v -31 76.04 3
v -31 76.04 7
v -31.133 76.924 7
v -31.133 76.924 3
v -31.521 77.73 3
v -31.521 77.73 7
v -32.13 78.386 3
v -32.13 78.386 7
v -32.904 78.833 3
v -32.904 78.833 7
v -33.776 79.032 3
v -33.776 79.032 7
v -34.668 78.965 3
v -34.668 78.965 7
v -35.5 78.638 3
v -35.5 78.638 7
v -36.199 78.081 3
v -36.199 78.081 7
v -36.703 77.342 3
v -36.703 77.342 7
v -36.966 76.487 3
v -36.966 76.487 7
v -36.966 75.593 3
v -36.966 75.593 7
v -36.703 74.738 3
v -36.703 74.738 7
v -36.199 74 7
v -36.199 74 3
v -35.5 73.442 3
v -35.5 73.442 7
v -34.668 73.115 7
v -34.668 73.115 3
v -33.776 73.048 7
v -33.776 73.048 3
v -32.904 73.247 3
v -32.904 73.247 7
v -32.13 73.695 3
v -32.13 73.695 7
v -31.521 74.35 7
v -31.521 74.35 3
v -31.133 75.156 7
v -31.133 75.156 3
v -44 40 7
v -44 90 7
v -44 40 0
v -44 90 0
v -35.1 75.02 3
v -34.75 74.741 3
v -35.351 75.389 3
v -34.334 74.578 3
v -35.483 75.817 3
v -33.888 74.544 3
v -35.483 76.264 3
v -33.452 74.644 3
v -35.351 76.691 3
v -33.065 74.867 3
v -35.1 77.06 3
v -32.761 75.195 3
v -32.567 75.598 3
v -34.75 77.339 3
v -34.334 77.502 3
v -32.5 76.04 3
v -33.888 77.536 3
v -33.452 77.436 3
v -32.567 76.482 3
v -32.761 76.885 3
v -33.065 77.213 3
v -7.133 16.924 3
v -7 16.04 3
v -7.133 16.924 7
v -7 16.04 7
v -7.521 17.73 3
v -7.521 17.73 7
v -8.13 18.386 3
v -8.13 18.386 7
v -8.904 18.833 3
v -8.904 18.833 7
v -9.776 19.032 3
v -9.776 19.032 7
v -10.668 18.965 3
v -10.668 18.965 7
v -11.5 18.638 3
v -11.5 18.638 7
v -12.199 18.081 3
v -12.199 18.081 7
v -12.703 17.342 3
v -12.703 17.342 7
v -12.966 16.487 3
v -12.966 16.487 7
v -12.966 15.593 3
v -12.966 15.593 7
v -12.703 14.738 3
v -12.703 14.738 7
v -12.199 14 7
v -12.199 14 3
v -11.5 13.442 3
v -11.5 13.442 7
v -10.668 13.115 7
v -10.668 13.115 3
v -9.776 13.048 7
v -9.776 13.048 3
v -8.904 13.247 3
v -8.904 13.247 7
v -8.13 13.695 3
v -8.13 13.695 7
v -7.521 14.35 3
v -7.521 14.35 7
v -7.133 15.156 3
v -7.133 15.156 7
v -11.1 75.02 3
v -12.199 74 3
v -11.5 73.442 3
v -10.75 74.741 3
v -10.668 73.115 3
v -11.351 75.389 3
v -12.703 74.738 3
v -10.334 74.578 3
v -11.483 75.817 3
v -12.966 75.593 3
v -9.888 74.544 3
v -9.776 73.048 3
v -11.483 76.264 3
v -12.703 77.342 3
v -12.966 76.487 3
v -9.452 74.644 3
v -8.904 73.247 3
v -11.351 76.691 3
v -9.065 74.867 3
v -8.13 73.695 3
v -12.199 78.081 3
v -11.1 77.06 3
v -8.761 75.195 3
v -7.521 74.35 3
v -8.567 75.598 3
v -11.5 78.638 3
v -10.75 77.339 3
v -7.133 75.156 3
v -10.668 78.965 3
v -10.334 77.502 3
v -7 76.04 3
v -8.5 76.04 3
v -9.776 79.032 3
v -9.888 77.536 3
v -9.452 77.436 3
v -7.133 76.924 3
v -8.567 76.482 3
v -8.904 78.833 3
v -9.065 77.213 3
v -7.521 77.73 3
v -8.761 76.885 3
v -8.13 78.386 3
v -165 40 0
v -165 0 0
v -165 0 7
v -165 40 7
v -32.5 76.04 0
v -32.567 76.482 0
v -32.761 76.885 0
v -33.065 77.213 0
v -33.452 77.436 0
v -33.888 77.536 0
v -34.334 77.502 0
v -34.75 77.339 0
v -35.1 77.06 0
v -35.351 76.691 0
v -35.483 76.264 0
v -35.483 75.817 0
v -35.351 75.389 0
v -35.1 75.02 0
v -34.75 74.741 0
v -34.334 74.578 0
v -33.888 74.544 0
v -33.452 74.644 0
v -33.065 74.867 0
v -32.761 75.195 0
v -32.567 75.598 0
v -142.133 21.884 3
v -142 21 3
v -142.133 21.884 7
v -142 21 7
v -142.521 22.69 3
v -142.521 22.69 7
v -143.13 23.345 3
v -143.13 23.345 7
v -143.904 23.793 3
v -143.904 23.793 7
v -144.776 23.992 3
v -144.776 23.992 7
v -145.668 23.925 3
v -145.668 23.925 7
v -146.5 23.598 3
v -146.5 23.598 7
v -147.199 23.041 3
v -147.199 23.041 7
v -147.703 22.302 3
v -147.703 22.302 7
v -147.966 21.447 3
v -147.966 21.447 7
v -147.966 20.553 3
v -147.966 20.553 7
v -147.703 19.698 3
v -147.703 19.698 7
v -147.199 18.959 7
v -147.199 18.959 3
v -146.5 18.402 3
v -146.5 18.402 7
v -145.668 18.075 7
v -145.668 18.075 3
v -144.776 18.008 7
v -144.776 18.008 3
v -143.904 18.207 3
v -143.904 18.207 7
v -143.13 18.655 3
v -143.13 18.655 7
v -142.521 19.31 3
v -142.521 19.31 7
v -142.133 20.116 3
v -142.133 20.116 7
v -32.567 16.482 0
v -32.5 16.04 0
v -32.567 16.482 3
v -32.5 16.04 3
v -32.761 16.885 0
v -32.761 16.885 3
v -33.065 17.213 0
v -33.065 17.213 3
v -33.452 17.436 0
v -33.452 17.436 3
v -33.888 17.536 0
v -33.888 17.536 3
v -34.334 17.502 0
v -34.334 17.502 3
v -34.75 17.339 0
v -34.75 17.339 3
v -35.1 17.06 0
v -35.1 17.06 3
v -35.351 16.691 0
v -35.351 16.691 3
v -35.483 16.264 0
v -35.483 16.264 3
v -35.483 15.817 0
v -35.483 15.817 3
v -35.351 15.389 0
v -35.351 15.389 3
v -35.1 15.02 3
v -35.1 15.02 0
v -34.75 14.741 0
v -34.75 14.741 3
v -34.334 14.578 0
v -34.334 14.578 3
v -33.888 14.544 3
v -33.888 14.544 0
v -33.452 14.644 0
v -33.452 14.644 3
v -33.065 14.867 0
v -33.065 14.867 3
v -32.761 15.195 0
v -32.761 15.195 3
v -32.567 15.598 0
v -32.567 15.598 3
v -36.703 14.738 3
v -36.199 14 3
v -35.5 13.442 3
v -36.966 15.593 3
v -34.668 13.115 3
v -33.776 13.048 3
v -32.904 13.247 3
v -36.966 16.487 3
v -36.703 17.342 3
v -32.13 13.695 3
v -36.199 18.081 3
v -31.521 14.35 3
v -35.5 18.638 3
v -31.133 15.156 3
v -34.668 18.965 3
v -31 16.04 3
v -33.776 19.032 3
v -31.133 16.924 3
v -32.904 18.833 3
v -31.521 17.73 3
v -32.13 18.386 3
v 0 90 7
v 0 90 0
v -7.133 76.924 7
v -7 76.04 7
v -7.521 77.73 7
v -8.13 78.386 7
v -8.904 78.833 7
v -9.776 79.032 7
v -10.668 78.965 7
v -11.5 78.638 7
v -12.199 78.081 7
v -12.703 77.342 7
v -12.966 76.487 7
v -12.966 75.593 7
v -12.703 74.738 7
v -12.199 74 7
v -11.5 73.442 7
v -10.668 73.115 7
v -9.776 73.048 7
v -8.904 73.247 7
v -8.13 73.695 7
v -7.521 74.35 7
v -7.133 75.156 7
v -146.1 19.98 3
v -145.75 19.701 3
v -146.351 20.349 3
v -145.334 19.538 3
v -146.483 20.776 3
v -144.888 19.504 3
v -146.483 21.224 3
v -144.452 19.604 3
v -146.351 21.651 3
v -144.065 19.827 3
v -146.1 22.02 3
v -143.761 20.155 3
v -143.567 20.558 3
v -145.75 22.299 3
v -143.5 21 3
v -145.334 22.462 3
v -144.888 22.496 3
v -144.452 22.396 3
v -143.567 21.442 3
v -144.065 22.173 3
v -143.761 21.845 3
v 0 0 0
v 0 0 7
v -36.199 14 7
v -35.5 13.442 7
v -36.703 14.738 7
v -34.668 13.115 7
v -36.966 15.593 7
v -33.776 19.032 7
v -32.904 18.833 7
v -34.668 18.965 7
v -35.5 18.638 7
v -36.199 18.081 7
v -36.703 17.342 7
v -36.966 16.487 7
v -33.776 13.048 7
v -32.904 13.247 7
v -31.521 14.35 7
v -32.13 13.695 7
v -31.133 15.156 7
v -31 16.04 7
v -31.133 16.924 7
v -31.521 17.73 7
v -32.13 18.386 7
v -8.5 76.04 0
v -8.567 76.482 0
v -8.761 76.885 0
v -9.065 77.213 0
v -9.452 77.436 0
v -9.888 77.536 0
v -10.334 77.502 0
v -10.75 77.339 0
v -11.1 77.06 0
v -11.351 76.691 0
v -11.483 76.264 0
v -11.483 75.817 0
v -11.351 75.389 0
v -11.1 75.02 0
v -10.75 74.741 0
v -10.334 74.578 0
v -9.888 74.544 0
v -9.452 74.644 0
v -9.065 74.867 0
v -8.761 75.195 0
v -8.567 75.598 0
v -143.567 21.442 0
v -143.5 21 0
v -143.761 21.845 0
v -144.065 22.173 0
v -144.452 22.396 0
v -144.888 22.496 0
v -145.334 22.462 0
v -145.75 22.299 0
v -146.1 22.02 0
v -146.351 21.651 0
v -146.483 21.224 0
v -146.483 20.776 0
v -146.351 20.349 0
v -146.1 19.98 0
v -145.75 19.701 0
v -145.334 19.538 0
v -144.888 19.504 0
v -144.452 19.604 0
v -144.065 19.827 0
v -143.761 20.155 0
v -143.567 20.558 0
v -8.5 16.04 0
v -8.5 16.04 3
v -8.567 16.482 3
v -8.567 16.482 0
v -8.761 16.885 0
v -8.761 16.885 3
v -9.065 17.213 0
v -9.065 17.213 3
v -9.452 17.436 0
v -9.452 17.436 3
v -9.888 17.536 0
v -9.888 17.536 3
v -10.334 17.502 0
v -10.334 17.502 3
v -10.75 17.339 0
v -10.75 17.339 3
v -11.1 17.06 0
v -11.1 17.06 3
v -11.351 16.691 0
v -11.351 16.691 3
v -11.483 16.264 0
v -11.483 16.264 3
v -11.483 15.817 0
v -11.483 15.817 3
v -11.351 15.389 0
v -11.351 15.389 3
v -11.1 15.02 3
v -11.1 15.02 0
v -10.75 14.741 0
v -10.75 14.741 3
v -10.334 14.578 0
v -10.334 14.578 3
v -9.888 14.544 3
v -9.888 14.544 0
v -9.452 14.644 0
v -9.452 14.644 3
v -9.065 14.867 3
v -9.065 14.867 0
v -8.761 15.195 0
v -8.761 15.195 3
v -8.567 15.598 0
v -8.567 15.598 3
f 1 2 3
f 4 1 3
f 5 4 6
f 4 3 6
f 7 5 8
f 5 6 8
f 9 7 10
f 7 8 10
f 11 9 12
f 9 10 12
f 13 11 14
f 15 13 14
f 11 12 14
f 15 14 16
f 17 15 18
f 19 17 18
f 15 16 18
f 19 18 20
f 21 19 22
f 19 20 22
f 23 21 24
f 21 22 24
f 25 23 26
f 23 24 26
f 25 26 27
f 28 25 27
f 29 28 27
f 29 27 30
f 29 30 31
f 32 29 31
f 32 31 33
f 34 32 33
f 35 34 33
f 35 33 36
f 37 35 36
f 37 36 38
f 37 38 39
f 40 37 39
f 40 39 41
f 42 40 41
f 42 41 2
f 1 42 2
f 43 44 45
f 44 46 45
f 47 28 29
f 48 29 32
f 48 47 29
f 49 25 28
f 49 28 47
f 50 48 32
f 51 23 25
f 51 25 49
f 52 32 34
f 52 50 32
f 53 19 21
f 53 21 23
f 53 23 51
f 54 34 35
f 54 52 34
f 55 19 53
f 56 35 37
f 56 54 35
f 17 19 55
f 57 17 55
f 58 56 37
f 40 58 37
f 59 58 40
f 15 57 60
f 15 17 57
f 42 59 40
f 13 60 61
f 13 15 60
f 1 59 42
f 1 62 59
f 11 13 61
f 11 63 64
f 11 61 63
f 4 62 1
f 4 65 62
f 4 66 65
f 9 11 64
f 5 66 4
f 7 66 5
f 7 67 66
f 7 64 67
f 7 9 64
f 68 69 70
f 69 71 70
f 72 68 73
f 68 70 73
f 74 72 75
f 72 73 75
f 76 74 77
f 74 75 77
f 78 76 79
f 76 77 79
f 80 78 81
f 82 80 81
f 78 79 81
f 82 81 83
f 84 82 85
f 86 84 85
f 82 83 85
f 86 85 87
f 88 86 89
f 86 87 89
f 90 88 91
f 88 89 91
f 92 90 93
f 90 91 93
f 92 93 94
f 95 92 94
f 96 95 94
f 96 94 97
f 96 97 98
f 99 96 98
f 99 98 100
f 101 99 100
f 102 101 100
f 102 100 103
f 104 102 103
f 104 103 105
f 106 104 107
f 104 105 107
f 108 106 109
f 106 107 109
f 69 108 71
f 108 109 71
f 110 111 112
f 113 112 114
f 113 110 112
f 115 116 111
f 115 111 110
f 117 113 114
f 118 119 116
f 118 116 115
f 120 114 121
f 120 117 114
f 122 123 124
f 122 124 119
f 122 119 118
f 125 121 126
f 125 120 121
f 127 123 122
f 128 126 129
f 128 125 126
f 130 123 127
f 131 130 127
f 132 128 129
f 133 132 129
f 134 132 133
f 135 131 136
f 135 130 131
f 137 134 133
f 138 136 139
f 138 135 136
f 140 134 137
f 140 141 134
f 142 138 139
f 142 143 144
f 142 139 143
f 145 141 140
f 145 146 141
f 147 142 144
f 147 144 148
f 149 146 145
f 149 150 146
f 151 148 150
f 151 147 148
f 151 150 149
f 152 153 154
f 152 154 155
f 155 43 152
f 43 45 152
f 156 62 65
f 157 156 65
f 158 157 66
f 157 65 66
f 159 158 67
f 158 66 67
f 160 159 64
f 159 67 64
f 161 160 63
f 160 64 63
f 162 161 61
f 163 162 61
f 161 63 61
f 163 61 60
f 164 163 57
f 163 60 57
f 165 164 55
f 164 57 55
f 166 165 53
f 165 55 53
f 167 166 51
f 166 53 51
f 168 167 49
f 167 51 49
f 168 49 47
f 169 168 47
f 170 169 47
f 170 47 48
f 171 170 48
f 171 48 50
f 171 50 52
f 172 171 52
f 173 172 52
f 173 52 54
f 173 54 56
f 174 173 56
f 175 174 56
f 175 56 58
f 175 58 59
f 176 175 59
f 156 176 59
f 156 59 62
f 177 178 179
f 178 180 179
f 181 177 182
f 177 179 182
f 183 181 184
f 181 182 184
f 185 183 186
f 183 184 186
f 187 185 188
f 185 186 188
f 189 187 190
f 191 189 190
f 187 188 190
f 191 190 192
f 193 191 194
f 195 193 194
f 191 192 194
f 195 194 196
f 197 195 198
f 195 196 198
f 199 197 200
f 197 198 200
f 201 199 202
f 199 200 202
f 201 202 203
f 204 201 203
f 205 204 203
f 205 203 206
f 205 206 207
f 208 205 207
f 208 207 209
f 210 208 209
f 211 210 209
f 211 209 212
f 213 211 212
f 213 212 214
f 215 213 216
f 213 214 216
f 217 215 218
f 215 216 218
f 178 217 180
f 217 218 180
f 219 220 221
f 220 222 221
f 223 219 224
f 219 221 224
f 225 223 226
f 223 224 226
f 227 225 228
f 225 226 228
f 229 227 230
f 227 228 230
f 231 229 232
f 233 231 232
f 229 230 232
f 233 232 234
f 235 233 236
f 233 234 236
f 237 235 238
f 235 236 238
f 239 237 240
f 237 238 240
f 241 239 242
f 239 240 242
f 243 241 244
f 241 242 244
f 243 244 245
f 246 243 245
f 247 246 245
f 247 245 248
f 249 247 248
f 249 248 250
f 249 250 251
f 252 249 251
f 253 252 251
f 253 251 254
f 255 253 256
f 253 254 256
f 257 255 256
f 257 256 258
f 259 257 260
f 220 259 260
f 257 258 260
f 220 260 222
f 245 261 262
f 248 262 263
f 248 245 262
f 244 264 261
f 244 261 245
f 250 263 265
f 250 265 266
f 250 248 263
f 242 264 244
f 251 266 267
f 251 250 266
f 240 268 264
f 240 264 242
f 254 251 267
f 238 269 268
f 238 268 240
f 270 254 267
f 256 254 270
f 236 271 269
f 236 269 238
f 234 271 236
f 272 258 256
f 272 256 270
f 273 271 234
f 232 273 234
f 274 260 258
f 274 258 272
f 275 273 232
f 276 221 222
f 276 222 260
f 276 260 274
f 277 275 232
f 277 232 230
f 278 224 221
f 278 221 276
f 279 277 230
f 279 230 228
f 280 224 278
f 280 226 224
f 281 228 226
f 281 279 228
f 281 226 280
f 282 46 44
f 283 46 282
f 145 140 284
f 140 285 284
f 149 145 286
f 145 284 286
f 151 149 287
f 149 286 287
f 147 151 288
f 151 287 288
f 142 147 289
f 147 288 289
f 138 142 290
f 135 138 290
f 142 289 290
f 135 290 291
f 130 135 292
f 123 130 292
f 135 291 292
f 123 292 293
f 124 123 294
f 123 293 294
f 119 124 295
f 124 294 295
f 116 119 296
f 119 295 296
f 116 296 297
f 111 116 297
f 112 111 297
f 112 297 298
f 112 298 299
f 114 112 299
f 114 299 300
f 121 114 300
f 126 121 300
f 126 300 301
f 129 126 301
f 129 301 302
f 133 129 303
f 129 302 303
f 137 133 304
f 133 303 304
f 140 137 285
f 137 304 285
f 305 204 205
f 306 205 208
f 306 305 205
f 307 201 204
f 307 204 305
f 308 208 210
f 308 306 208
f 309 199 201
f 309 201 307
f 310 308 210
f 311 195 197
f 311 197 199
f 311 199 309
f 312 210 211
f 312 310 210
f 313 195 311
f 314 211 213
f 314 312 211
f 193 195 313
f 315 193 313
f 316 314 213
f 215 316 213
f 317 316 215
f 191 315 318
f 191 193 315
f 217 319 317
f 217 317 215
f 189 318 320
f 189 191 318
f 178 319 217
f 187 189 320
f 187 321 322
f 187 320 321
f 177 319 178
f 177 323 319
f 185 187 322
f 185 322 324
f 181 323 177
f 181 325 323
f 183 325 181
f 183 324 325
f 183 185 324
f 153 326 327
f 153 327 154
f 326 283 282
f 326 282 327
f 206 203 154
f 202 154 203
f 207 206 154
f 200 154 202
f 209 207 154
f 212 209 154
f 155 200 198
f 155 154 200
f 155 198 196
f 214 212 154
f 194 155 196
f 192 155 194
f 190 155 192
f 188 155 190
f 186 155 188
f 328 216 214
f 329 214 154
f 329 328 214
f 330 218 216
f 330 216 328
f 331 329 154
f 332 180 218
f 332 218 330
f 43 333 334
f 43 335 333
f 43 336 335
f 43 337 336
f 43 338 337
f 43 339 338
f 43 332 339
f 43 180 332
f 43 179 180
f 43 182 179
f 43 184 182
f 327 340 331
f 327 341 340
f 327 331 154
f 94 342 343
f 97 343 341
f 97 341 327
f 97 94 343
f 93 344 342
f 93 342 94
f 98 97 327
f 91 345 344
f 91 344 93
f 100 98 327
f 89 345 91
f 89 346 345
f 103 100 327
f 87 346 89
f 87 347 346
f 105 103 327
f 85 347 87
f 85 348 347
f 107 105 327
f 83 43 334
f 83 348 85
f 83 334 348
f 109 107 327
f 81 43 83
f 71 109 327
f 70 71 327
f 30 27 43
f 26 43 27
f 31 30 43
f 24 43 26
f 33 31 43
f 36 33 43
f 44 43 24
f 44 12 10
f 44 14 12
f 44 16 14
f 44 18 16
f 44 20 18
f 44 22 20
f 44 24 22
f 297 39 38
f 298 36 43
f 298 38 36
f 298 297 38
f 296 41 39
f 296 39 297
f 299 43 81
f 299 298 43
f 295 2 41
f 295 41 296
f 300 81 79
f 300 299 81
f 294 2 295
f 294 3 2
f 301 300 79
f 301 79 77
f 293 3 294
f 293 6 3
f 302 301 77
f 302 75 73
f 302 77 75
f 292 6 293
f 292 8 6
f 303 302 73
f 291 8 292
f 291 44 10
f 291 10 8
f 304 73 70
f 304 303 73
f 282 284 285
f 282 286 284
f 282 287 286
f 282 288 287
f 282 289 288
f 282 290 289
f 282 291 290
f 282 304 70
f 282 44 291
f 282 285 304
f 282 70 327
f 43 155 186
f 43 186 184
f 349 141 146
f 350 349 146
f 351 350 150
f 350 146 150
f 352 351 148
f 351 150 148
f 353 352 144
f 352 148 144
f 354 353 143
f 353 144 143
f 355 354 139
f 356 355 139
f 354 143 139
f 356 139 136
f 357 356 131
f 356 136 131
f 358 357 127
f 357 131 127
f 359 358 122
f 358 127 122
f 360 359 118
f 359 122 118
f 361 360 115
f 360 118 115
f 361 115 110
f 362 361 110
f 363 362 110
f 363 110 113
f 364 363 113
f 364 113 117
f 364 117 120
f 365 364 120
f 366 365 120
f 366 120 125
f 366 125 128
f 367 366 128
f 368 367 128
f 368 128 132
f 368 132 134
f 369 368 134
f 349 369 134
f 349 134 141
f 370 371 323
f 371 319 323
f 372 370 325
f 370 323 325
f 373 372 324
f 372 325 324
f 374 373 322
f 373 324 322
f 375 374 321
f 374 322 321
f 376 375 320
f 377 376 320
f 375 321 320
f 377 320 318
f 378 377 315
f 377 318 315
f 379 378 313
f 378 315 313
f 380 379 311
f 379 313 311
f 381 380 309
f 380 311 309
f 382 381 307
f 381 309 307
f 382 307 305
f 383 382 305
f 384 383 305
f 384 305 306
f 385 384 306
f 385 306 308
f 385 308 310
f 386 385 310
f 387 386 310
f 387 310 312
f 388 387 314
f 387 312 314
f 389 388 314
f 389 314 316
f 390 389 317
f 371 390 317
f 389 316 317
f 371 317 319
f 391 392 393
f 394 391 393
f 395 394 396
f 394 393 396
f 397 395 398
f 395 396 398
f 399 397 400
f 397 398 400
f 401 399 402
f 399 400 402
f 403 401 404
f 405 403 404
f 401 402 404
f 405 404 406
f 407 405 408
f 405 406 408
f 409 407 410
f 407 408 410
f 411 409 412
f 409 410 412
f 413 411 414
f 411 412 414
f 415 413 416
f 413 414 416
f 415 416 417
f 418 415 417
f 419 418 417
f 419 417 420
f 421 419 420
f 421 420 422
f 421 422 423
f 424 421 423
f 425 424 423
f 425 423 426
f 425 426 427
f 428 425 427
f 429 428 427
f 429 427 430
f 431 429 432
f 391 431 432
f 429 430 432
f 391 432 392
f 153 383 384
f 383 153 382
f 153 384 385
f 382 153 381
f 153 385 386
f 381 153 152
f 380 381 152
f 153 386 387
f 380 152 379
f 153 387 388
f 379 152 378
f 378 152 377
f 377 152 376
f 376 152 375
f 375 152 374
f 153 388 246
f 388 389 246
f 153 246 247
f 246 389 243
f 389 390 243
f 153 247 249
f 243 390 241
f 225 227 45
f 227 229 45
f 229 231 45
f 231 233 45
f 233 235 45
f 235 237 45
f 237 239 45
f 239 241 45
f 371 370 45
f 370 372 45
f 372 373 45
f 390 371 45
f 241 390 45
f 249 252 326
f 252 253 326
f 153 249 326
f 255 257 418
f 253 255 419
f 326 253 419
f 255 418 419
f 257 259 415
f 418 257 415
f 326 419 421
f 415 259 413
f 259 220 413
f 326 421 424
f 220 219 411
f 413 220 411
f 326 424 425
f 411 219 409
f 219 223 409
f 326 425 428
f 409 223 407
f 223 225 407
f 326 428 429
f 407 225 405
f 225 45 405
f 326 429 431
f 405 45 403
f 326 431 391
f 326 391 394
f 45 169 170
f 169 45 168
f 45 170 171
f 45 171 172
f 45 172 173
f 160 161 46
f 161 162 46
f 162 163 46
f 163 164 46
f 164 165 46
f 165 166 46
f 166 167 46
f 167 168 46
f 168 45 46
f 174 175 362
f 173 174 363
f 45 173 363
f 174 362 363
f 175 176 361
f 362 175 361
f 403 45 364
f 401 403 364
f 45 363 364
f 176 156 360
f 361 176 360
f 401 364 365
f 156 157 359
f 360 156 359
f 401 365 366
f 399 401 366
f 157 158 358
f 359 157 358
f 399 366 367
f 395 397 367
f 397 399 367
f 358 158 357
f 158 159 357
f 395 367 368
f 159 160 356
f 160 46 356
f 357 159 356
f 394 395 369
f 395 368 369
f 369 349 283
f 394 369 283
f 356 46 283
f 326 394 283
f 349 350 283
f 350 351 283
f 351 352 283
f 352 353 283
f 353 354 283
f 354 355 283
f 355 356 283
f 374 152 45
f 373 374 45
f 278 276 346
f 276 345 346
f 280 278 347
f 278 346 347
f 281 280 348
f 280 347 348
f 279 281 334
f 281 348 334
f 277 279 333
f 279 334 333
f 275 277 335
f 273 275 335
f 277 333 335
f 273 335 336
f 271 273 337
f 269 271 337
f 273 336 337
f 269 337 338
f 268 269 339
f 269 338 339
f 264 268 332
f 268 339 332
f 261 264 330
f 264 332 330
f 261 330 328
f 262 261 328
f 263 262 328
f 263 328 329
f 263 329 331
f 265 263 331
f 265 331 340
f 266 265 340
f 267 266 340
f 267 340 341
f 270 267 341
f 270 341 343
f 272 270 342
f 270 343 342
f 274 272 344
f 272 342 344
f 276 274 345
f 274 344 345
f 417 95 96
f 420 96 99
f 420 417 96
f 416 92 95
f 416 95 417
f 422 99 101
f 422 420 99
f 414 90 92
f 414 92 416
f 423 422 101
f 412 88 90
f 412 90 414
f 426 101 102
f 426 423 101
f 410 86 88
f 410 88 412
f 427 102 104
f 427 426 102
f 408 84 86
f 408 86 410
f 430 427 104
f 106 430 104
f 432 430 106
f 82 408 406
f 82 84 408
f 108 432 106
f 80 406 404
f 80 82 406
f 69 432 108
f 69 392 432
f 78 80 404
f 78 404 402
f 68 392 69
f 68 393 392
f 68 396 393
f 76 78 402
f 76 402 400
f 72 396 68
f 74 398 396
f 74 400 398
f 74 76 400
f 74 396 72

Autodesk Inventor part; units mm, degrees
ref_plane "YZ Plane" through (0, 0, 0) normal (1, 0, 0) x (0, 1, 0)
ref_plane "XZ Plane" through (0, 0, 0) normal (0, 1, 0) x (-1, 0, 0)
ref_plane "XY Plane" through (0, 0, 0) normal (0, 0, 1) x (1, 0, 0)
sketch "Sketch1" plane through (0, 0, 0) normal (0, 0, 1) x (1, 0, 0)
  line L0 (0, 0) -> (-165, 0)
  line L1 (-165, 0) -> (-165, 90)
  line L2 (-165, 90) -> (0, 90)
  line L3 (0, 90) -> (0, 0)
  line L4 (-165, 90) -> (-44, 90)
  line L5 (-44, 90) -> (-44, 40)
  line L6 (-44, 40) -> (-165, 40)
  line L7 (-165, 40) -> (-165, 90)
  dimension "d0" = 165
  dimension "d1" = 90
  dimension "d2" = 121
  dimension "d3" = 50
extrude "Extrusion1" add sketch "Sketch1" along normal blind 7 contours L0 L1 L6 L5 L2 L3
sketch "Sketch2" plane through (0, 0, 7) normal (0, 0, 1) x (1, 0, 0)
  circle A0 centre (-10, 76.0401) radius 1.5
  line L0 (0, 90) -> (-44, 90) projected
  line L1 (-22, 90) -> (-22, 0)
  circle A1 centre (-34, 76.0401) radius 1.5
  circle A2 centre (-10, 16.0401) radius 1.5
  circle A3 centre (-34, 16.0401) radius 1.5
  circle A4 centre (-145, 21) radius 1.5
  line L2 (-165, 40) -> (-165, 0) projected
  line L3 (-44, 40) -> (-165, 40) projected
  line L4 (-165, 0) -> (0, 0) projected
  dimension "d6" = 3
  dimension "d7" = 24
  dimension "d8" = 3
  dimension "d9" = 60
  dimension "d10" = 3
  dimension "d11" = 20
  dimension "d15" = 21
extrude "Extrusion2" cut sketch "Sketch2" against normal blind 10
sketch "Sketch3" plane through (0, 0, 7) normal (0, 0, 1) x (1, 0, 0)
  circle A0 centre (-10, 16.0401) radius 1.5 projected
  circle A1 centre (-10, 16.0401) radius 3
  line L0 (0, 90) -> (-44, 90) projected
  line L1 (-22, 90) -> (-22, 0)
  line L2 (-165, 0) -> (0, 0) projected
  line L3 (-22, 90) -> (68, 90) construction
  circle A2 centre (-10, 76.0401) radius 1.5 projected
  circle A3 centre (-10, 76.0401) radius 3
  circle A4 centre (-34, 16.0401) radius 3
  circle A5 centre (-34, 76.0401) radius 3
  circle A6 centre (-145, 21) radius 1.5 projected
  circle A7 centre (-145, 21) radius 3
  dimension "d16" = 6
  dimension "d17" = 90
  dimension "d18" = 6
  dimension "d19" = 6
extrude "Extrusion3" cut sketch "Sketch3" against normal blind 4
properties part number "alt platform"
